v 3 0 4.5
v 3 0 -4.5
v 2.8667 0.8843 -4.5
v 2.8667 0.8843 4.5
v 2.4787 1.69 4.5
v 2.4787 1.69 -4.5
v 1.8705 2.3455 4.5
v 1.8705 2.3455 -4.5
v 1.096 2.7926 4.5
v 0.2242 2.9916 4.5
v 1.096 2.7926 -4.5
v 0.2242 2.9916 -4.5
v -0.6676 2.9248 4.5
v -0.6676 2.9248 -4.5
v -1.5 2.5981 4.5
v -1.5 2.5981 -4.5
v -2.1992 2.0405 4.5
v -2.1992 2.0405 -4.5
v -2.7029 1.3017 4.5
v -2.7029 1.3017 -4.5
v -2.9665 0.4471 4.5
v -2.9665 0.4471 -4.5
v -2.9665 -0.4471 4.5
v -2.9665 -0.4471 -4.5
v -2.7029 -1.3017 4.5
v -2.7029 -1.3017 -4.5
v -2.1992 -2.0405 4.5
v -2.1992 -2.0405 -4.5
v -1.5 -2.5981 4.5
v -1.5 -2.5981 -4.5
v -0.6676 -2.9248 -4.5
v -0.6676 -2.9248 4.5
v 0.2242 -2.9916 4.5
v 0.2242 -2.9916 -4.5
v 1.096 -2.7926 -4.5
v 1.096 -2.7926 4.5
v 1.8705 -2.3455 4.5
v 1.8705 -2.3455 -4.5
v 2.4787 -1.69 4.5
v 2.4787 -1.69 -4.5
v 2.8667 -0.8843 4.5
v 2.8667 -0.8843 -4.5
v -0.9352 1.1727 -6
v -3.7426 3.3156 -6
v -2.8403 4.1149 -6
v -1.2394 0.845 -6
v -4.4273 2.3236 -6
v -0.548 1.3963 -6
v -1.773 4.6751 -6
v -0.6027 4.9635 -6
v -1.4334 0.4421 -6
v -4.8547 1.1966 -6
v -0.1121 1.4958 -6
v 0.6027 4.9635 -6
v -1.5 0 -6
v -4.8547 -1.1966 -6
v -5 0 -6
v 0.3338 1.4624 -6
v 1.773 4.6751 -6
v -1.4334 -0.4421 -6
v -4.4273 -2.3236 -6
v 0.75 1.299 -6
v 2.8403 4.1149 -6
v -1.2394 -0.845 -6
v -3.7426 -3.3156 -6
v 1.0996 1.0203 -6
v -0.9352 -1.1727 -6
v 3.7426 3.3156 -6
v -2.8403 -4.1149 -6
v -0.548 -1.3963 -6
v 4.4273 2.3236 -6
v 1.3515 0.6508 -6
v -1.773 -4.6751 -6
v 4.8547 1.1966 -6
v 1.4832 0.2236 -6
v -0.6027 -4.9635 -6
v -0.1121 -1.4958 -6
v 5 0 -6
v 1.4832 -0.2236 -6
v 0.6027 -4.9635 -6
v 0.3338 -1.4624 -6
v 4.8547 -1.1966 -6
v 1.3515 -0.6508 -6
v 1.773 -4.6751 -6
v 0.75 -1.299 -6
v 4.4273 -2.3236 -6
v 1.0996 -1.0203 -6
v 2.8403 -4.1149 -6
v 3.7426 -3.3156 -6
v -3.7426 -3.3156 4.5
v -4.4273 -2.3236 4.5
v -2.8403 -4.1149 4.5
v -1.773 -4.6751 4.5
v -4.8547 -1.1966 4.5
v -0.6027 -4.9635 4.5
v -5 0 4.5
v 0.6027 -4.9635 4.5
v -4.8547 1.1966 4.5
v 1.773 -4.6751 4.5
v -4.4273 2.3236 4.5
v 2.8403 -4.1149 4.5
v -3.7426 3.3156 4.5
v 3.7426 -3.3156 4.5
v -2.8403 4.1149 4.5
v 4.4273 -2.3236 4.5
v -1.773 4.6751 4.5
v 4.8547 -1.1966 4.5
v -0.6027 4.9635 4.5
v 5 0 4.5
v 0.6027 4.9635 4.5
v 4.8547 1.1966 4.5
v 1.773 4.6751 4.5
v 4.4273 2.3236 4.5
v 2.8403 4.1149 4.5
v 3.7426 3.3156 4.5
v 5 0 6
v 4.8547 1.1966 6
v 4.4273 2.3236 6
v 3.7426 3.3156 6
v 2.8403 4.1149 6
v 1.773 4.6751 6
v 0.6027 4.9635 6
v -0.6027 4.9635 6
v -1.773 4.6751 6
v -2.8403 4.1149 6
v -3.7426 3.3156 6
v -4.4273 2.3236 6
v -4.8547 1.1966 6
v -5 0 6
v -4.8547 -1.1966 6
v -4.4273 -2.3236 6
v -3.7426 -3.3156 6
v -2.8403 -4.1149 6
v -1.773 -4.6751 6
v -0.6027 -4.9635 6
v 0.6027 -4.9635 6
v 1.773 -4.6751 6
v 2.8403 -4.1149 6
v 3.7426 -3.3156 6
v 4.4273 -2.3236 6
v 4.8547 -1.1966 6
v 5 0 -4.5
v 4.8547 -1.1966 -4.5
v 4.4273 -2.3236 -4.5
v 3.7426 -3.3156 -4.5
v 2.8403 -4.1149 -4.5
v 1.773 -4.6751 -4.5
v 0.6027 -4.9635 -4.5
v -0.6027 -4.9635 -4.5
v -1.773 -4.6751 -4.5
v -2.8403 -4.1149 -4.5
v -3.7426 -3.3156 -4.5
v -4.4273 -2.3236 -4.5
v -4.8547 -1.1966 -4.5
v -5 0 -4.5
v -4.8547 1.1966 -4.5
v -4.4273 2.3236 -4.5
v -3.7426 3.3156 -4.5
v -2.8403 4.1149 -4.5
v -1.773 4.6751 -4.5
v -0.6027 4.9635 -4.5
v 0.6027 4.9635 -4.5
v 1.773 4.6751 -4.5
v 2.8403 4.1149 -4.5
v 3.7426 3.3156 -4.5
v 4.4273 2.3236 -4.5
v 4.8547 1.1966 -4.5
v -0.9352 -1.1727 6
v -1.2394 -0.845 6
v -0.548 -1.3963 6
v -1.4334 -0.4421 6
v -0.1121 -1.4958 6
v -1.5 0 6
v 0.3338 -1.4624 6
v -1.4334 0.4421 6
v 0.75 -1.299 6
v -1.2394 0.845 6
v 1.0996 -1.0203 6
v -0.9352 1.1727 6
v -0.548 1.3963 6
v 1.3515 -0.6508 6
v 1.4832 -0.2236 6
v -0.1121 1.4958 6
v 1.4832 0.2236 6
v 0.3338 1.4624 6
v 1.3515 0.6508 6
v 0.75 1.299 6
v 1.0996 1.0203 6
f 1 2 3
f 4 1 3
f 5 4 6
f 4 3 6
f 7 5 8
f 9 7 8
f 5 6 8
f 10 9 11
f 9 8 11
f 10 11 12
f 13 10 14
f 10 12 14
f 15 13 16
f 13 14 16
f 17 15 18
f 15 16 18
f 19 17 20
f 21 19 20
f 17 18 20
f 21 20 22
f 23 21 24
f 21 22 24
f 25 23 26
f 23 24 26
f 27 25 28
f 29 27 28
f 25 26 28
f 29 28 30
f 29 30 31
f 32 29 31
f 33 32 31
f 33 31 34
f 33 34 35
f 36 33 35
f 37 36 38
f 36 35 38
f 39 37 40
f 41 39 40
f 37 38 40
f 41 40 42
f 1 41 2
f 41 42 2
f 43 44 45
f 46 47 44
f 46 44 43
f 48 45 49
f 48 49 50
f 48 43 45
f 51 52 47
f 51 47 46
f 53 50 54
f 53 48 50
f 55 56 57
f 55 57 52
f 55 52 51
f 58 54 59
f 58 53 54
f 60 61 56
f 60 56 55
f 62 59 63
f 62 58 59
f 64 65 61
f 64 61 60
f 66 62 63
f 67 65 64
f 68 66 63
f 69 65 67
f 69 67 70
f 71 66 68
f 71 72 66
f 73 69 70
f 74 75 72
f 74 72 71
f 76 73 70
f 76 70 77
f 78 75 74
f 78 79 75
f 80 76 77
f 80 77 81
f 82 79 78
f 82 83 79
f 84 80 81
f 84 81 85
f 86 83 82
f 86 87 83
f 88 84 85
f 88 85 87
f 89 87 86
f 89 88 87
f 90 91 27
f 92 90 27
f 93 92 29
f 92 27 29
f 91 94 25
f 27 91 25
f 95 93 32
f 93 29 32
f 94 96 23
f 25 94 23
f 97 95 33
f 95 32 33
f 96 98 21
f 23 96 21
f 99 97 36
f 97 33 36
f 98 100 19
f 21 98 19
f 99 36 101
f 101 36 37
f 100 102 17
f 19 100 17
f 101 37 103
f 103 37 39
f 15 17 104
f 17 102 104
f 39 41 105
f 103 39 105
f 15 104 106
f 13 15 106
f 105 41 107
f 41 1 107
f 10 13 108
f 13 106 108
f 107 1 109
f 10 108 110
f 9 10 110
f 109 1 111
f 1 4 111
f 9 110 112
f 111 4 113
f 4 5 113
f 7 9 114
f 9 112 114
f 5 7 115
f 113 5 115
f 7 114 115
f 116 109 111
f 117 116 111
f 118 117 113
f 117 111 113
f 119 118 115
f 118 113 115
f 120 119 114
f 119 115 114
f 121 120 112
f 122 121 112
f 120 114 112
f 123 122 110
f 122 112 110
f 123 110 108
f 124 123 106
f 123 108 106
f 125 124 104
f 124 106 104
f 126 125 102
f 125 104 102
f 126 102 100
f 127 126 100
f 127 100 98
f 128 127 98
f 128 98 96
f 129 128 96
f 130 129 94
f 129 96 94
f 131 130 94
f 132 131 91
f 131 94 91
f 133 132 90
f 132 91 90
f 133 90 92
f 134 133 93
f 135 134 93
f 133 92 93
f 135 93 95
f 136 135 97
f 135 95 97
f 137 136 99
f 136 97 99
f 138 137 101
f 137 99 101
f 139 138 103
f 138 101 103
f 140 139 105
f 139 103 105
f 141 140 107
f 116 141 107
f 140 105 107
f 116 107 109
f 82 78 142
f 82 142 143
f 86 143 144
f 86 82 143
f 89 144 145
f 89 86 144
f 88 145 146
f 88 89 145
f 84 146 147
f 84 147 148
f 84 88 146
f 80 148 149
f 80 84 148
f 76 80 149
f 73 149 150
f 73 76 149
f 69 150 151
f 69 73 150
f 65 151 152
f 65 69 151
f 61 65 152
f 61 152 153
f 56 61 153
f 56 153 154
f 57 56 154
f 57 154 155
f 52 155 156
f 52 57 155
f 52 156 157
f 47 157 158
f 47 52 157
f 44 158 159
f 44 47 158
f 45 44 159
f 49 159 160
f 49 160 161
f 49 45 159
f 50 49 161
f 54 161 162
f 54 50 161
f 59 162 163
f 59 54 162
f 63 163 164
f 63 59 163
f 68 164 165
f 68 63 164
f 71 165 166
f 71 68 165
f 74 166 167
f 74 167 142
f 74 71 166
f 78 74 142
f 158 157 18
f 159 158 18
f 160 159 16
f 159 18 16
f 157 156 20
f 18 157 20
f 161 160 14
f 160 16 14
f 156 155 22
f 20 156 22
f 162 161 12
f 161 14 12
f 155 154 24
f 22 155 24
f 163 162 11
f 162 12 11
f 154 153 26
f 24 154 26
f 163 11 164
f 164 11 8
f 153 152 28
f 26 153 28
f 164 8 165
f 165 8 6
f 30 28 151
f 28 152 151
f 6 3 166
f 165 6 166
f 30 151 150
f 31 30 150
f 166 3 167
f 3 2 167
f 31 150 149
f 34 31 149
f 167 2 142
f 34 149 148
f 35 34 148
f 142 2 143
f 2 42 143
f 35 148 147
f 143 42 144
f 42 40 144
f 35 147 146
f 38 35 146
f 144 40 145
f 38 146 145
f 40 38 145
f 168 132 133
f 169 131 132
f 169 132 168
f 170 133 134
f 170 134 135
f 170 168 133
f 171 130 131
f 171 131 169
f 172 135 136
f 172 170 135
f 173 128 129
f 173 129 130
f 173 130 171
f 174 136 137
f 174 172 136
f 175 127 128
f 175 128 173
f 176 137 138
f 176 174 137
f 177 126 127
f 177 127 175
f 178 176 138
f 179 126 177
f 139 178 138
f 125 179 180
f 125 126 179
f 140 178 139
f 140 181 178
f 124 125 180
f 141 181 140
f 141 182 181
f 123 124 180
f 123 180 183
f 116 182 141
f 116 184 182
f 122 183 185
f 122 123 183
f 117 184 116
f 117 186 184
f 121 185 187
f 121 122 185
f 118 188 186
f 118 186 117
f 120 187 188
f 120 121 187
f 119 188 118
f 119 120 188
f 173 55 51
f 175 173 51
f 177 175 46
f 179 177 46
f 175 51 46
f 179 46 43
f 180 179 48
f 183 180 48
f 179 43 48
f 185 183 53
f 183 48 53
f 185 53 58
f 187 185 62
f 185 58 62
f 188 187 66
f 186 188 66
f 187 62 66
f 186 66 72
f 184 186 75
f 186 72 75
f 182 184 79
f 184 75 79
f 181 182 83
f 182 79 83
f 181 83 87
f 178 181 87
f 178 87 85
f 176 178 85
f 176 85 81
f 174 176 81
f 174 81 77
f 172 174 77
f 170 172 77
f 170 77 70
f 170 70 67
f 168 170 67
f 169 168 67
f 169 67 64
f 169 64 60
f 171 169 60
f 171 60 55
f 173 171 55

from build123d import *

# Parameters (mm, degrees)
EXTRUDE_1_DEPTH      = 4.5
EXTRUDE_1_DEPTH_BACK = 4.5
SKETCH_1_R           = 3
SKETCH_2_R           = 5
EXTRUDE_2_DEPTH      = 1.5
EXTRUDE_START        = 1.5
SKETCH_3_R           = 5
EXTRUDE_3_DEPTH      = 1.5
SKETCH_4_R           = 1.5
CUT_EXTRUDE_1_DEPTH  = 14.928388277


with BuildPart() as part:
    # 草图1 → 凸台-拉伸1 (new, two sides: drawn at the far end of the back side and taken through both)
    with BuildSketch(Plane.XY.offset(-EXTRUDE_1_DEPTH_BACK)):
        Circle(SKETCH_1_R)
    extrude(amount=EXTRUDE_1_DEPTH + EXTRUDE_1_DEPTH_BACK)

    # 草图2 → 凸台-拉伸2 (add)
    with BuildSketch(Plane.XY.offset(4.5)):
        Circle(SKETCH_2_R)
    extrude(amount=EXTRUDE_2_DEPTH)

    # 草图3 → 凸台-拉伸3 (add)
    with BuildSketch(Plane(origin=(0, 0, -4.5), x_dir=(-1, 0, 0), z_dir=(0, 0, -1)).offset(EXTRUDE_START)):
        Circle(SKETCH_3_R)
    extrude(amount=-EXTRUDE_3_DEPTH)

    # 草图4 → 切除-拉伸1 (cut, through all)
    with BuildSketch(Plane(origin=(0, 0, -6), x_dir=(-1, 0, 0), z_dir=(0, 0, -1))):
        Circle(SKETCH_4_R)
    extrude(amount=-CUT_EXTRUDE_1_DEPTH, mode=Mode.SUBTRACT)


solid = part.part
